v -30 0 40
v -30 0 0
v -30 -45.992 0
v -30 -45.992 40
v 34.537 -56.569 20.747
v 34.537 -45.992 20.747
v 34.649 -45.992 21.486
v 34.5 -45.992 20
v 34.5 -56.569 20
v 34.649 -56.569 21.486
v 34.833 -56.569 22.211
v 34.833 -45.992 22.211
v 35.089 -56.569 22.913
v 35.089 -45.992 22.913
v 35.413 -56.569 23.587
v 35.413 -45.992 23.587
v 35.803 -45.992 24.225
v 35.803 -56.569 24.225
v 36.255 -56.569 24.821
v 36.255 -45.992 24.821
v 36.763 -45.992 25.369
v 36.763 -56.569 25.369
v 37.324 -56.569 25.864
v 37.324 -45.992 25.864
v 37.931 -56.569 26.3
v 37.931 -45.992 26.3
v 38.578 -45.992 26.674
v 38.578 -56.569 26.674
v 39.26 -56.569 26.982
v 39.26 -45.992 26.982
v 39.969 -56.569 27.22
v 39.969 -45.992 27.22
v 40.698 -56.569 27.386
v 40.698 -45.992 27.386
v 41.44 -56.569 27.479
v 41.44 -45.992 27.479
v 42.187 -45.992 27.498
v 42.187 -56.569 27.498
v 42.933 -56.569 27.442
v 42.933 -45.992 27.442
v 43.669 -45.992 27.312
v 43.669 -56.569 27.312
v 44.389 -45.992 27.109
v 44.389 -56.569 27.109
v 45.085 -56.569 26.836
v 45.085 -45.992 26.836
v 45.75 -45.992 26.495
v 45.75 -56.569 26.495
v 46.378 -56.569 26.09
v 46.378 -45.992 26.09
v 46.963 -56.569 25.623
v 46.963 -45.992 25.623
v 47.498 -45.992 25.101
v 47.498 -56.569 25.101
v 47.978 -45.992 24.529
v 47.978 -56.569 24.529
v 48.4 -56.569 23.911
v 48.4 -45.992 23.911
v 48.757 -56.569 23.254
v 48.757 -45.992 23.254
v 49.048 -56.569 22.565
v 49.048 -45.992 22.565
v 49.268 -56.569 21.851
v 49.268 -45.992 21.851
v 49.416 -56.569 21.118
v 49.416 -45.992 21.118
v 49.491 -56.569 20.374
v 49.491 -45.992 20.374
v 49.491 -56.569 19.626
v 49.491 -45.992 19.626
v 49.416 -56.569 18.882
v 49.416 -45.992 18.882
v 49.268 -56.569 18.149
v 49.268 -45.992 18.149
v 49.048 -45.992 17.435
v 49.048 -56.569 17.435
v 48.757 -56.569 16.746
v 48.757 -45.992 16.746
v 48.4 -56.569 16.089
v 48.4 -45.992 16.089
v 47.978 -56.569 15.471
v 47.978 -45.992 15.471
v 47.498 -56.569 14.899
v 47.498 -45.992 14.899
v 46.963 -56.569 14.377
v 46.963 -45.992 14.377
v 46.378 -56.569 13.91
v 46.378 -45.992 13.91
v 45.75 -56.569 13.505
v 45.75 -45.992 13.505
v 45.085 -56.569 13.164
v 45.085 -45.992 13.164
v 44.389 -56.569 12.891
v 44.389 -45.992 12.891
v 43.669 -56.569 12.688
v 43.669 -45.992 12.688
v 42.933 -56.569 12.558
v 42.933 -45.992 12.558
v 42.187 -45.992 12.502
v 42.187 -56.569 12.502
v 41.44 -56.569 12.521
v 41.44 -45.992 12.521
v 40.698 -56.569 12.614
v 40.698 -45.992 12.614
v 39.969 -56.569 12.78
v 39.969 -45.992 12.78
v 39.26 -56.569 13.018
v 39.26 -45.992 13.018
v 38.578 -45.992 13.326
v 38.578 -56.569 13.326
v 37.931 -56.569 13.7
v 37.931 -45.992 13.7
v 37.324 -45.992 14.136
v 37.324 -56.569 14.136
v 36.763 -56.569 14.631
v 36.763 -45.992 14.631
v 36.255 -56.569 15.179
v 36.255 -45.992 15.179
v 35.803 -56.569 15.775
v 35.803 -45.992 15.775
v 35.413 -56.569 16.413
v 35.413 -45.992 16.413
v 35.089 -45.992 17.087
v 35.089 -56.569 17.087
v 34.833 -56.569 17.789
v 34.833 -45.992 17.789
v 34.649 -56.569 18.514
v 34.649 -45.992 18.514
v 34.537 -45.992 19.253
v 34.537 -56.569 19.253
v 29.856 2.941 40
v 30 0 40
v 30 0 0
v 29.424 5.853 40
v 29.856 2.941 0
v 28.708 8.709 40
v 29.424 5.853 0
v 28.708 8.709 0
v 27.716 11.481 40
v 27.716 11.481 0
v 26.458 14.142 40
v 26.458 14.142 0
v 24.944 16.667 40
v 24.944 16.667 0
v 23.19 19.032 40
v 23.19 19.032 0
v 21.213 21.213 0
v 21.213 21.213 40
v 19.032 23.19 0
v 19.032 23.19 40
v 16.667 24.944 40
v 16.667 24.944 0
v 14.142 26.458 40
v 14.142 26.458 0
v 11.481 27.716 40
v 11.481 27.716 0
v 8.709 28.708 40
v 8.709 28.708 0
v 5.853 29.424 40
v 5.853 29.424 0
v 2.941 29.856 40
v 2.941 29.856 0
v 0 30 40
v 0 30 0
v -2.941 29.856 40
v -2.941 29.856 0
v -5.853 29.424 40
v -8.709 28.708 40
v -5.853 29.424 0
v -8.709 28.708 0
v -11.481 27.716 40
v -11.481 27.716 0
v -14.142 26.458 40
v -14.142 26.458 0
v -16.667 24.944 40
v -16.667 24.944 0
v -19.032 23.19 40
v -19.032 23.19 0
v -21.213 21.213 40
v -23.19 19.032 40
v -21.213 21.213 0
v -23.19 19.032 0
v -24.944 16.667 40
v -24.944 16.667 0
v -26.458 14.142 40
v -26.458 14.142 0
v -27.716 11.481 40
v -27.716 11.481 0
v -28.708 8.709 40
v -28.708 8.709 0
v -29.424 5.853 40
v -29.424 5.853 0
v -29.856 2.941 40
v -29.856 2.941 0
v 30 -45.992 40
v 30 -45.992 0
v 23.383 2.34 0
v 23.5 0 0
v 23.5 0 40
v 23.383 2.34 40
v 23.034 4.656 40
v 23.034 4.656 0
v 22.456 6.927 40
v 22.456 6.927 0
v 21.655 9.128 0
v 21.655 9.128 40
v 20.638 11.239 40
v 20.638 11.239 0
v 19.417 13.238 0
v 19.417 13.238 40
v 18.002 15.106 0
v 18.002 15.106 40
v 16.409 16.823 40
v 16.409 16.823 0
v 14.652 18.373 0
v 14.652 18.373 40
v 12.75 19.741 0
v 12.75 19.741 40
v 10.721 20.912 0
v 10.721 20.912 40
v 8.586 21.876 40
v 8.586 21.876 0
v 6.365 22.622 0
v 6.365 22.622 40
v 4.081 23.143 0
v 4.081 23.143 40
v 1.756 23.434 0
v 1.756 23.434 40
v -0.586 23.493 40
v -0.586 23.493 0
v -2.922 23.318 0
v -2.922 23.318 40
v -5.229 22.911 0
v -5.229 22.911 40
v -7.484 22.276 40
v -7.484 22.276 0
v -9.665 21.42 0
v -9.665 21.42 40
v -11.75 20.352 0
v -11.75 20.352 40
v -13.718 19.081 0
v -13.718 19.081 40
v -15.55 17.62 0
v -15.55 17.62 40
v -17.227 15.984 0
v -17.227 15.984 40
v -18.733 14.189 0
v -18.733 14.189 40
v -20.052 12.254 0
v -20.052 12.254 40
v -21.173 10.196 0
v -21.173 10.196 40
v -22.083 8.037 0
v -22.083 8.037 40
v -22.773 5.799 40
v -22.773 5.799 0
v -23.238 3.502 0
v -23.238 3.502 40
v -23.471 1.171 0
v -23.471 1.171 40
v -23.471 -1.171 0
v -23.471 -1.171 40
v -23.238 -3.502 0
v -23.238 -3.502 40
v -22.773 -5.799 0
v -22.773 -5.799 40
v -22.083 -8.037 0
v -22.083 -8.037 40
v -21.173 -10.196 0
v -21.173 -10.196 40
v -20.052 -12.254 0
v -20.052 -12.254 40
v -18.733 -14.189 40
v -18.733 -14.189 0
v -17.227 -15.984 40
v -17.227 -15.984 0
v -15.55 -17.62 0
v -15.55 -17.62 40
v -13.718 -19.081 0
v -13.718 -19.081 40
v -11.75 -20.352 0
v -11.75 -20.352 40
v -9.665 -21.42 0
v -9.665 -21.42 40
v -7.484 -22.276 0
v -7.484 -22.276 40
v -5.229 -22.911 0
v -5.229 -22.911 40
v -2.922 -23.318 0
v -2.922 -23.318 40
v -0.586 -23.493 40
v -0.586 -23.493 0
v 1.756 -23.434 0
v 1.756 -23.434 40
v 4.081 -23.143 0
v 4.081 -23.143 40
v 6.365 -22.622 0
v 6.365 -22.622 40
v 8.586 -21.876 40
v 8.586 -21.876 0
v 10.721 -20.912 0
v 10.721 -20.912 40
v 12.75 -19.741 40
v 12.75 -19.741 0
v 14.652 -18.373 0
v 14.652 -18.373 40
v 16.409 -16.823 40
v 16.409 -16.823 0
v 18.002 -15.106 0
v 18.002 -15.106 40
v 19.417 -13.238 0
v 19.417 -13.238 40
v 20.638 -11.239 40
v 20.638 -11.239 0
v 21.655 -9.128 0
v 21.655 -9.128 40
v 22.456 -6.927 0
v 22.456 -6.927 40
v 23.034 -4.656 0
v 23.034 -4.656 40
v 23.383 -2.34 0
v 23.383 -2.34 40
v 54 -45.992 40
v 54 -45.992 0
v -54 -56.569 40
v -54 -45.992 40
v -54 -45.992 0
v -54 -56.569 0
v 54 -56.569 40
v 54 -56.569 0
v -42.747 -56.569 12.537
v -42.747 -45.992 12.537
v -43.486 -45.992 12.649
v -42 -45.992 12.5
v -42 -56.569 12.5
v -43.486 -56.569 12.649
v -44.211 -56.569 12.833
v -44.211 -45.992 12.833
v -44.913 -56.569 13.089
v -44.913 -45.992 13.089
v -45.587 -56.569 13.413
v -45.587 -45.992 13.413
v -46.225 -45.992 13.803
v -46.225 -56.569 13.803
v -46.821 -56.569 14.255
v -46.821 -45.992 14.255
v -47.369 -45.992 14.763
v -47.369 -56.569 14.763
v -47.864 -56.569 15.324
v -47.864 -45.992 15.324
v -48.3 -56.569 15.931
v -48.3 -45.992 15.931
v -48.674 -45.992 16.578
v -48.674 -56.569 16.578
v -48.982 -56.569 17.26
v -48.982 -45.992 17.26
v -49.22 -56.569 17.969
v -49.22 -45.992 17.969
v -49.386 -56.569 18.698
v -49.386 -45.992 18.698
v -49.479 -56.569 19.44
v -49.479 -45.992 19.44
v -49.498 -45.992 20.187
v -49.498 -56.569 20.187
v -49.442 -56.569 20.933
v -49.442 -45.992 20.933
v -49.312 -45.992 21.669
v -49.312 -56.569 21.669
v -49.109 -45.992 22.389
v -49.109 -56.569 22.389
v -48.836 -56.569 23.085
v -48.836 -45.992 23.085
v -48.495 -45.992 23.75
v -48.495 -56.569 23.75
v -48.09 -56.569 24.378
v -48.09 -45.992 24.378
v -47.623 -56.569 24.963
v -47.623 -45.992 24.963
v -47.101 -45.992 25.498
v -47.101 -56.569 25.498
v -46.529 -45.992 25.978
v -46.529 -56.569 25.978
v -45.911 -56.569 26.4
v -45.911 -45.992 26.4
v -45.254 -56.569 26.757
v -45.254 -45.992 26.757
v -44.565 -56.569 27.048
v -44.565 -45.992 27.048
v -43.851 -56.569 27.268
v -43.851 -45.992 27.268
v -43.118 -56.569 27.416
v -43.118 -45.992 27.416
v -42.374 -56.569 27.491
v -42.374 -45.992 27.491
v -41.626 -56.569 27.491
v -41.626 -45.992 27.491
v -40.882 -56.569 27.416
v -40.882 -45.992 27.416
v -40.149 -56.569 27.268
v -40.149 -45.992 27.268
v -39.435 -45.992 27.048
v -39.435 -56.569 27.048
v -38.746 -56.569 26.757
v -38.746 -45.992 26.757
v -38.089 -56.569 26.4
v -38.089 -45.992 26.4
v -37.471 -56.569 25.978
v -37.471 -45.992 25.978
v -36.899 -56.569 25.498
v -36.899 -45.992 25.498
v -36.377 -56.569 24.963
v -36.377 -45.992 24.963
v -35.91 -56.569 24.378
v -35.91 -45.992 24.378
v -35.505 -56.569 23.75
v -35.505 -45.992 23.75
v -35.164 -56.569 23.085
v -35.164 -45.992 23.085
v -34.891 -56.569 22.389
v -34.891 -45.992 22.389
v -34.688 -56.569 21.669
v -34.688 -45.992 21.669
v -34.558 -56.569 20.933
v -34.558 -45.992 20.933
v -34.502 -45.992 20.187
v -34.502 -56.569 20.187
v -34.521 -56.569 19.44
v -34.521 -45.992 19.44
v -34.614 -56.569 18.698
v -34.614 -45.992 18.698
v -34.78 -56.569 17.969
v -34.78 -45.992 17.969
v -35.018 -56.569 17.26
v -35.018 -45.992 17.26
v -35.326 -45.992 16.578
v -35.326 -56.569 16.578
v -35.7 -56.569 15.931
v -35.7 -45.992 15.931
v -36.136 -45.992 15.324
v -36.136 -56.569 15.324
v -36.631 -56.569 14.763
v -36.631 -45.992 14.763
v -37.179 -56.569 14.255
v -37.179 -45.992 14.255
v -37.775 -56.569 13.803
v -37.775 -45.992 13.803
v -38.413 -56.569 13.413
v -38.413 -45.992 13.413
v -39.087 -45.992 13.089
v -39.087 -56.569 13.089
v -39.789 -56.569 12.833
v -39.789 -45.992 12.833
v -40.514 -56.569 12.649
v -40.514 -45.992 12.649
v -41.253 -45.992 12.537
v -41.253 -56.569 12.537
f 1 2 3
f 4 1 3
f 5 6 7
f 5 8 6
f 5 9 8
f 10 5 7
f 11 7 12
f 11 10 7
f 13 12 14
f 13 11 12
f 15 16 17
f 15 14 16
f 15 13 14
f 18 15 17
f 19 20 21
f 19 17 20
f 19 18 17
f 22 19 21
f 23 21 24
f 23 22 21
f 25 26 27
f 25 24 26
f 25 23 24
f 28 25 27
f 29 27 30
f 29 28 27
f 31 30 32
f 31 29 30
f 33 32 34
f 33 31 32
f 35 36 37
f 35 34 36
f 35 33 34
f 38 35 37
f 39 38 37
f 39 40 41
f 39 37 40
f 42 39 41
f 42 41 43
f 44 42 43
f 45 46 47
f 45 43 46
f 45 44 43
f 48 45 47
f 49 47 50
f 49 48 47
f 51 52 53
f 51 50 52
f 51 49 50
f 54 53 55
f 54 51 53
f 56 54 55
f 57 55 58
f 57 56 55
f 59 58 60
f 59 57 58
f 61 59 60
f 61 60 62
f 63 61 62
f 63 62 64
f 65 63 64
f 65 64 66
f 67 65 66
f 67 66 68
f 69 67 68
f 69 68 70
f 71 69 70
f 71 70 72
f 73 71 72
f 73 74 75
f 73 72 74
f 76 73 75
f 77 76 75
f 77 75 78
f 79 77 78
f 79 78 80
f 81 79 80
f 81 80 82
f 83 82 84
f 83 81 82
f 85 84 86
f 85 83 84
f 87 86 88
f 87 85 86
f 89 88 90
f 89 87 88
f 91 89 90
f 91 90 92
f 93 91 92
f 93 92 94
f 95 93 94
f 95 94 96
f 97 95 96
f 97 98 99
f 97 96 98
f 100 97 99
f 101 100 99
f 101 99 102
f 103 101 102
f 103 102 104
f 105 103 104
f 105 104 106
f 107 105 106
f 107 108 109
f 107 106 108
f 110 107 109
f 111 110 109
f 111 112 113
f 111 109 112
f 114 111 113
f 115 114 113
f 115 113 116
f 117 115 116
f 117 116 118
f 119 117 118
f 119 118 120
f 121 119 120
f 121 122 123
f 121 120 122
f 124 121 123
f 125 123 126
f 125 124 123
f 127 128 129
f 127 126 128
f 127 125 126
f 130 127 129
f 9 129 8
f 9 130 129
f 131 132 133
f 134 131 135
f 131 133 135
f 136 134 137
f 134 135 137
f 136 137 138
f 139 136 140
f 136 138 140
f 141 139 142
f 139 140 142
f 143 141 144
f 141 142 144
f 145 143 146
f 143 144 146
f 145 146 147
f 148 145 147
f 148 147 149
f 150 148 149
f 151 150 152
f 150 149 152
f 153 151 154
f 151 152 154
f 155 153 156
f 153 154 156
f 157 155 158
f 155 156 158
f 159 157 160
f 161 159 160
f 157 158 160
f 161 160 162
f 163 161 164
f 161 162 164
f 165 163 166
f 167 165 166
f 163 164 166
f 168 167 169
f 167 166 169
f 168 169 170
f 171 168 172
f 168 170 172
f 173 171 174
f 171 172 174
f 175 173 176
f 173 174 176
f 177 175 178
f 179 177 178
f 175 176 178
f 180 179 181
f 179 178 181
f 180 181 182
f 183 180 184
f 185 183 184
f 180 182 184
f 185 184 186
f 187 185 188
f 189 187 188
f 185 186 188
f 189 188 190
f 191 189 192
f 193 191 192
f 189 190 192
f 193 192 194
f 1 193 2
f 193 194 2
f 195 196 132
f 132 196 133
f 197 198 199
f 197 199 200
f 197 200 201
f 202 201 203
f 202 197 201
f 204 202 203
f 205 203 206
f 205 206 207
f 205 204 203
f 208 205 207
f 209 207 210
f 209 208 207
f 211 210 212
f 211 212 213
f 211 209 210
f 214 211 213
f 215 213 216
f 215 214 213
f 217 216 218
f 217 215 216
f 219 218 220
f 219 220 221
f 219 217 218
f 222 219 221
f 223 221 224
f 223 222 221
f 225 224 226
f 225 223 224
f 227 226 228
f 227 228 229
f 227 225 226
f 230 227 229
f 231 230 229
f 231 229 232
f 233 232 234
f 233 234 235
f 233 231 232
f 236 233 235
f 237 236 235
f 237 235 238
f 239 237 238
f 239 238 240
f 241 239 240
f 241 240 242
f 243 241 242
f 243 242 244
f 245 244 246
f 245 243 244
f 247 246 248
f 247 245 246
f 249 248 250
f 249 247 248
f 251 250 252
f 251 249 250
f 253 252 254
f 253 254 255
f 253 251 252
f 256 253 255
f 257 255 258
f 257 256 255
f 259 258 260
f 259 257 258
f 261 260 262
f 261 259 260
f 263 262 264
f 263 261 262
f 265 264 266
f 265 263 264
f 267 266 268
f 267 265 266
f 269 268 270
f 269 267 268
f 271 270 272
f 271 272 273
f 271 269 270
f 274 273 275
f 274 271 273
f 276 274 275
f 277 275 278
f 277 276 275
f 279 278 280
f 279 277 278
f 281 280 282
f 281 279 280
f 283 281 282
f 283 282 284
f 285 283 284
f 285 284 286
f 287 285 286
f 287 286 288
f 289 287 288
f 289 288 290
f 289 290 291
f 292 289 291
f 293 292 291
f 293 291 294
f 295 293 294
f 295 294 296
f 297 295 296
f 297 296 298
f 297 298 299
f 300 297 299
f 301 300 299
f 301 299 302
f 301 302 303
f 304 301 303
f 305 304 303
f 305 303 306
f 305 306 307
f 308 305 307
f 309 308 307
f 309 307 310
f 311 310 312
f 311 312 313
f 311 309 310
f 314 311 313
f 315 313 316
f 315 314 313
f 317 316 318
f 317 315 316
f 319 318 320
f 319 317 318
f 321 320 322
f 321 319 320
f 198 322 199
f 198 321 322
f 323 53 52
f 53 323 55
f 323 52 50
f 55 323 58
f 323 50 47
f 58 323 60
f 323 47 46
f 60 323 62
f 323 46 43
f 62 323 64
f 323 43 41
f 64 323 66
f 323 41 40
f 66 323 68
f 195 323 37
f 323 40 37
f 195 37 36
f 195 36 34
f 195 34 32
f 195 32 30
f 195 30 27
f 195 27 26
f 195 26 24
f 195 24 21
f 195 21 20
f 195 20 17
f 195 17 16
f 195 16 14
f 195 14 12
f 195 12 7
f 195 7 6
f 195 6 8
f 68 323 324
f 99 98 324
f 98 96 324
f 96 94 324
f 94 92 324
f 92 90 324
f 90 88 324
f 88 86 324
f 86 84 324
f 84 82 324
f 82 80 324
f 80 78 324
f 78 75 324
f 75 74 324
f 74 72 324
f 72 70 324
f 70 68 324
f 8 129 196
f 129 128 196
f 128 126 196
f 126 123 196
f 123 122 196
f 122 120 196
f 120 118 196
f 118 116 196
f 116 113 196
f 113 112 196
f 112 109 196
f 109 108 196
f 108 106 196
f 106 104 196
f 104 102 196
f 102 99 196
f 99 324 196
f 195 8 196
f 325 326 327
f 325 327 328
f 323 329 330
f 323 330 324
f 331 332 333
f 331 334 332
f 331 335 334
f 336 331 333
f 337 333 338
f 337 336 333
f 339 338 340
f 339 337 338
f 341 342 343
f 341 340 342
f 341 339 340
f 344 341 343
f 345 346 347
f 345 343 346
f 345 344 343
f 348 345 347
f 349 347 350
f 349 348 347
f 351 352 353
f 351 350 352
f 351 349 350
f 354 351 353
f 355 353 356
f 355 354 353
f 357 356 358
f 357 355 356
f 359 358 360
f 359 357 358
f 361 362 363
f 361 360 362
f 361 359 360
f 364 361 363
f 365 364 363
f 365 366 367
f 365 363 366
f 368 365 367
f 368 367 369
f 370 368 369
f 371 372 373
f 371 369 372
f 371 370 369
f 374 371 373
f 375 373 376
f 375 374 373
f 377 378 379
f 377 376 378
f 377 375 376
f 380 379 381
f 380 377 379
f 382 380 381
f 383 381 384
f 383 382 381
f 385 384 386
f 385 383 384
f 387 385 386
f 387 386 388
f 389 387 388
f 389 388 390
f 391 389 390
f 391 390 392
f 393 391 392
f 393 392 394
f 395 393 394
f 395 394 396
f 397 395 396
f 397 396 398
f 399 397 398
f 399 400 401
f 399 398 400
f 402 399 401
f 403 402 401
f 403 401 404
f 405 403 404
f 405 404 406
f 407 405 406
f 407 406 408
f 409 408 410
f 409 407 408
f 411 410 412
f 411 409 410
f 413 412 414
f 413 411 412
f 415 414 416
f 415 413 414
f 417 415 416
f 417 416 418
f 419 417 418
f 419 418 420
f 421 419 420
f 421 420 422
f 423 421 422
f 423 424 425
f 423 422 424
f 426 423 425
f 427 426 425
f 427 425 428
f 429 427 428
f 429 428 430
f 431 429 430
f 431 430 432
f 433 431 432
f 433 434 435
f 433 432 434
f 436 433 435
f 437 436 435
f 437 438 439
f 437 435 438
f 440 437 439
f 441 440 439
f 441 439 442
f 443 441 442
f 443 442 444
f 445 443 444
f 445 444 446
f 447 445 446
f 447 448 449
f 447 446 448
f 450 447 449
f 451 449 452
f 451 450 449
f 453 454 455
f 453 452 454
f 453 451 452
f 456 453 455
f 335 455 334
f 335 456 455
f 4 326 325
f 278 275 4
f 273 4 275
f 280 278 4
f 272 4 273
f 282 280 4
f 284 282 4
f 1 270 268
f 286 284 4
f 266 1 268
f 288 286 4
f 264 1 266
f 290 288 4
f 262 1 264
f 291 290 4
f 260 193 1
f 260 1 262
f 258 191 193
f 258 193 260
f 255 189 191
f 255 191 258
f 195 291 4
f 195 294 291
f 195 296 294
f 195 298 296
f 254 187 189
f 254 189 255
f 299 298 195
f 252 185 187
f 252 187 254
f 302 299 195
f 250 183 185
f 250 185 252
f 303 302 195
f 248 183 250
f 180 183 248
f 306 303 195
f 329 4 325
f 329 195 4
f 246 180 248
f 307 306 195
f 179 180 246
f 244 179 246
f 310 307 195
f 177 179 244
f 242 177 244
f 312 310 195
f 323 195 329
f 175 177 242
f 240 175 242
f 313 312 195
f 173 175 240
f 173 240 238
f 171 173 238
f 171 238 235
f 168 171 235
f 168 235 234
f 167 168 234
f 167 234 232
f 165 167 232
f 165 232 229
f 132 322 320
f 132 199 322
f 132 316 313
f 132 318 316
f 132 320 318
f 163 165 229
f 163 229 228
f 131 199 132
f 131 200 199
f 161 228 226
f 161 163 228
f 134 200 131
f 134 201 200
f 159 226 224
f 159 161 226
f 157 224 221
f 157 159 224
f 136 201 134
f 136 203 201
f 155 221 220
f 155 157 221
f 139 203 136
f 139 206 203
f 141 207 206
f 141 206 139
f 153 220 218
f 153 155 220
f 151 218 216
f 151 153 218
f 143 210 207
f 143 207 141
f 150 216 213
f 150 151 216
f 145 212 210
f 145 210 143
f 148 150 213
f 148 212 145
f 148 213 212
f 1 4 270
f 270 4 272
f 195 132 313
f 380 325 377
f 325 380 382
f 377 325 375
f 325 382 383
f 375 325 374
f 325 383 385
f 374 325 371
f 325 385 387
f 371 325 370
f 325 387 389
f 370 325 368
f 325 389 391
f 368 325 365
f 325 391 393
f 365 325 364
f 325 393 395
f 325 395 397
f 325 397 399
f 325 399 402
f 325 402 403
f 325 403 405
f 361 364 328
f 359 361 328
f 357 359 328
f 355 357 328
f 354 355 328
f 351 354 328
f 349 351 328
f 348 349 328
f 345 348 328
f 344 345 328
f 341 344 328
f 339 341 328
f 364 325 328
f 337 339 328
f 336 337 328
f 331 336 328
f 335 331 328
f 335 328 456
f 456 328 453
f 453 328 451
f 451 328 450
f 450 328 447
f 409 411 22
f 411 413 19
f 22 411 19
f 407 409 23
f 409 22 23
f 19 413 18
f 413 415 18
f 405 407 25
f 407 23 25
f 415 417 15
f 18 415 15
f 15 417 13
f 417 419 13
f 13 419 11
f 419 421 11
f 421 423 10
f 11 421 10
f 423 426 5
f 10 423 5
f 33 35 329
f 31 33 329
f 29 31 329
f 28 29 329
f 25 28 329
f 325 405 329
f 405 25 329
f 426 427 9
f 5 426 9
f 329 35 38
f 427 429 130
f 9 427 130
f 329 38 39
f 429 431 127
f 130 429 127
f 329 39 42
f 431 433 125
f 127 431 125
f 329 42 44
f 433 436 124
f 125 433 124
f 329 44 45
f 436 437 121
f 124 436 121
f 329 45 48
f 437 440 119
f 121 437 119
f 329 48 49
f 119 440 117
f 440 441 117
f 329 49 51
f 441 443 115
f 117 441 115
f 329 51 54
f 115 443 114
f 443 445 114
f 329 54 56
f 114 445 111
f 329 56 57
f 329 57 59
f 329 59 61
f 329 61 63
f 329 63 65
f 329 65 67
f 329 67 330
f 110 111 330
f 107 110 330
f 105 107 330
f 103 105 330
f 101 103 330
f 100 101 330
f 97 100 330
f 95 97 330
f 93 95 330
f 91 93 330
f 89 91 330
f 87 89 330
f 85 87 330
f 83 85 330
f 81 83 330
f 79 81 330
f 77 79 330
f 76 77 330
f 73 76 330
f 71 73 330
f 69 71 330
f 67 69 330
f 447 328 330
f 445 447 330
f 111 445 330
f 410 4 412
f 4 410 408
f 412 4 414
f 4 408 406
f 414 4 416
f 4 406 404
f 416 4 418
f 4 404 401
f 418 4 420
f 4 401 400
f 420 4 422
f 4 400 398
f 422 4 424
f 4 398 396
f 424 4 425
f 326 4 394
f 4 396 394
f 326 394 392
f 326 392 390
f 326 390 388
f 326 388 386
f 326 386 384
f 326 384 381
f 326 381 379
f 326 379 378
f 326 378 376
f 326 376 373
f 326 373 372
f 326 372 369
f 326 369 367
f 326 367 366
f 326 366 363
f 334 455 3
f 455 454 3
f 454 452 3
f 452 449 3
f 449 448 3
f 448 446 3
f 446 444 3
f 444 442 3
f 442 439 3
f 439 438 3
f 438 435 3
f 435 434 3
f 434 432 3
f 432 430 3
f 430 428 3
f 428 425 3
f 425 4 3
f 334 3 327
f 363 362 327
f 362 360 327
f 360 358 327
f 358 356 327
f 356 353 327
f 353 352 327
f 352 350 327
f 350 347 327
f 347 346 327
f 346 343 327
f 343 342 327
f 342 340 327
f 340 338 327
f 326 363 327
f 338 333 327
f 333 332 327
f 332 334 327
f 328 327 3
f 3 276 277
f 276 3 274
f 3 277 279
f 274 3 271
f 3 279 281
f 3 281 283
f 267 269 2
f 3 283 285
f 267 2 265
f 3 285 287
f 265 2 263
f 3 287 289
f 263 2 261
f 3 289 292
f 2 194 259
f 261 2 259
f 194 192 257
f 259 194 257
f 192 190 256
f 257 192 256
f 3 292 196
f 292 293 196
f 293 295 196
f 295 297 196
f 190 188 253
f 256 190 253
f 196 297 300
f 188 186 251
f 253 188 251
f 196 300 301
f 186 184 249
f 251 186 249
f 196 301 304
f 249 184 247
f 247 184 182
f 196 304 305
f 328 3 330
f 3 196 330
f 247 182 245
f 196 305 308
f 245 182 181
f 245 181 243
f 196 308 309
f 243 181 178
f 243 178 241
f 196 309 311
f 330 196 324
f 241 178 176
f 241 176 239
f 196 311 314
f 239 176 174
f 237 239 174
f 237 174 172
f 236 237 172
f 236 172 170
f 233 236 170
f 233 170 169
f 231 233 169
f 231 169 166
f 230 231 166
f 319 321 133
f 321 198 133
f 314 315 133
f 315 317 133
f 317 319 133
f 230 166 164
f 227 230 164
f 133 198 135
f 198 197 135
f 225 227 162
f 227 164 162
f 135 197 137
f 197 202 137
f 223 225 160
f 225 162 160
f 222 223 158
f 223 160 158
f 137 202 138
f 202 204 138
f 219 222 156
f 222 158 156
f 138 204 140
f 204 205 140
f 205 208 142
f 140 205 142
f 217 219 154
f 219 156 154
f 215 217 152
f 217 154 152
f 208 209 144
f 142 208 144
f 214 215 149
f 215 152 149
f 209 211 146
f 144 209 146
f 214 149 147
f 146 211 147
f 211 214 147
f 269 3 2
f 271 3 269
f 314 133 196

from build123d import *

# Parameters (mm, degrees)
SKETCH1_R               = 23.5
BOSS_EXTRUDE1_DEPTH     = 40
CUT_EXTRUDE1_DEPTH      = 102.443199391
CUT_EXTRUDE1_DEPTH_BACK = 102.443199391
SKETCH2_R               = 7.5


with BuildPart() as part:
    # Sketch1 → Boss-Extrude1 (new body)
    with BuildSketch(Plane.XY):
        with BuildLine():
            Line((-30, 0), (-30, -45.991596264))
            Line((-30, -45.991596264), (-54, -45.991596264))
            Line((-54, -45.991596264), (-54, -56.568744975))
            Line((-54, -56.568744975), (54, -56.568744975))
            Line((54, -56.568744975), (54, -45.991596264))
            Line((54, -45.991596264), (30, -45.991596264))
            Line((30, -45.991596264), (30, 0))
            ThreePointArc((30, 0), (0, 30), (-30, 0))
        make_face()
        Circle(SKETCH1_R, mode=Mode.SUBTRACT)
    extrude(amount=BOSS_EXTRUDE1_DEPTH)

    # Sketch2 → Cut-Extrude1 (cut, two sides: drawn at the far end of the back side and taken through both)
    with BuildSketch(Plane(origin=(0, -45.991596264, 0), x_dir=(1, 0, 0), z_dir=(0, 1, 0)).offset(-CUT_EXTRUDE1_DEPTH_BACK)):
        with Locations(Location((42, -20, 0), (0, 0, 180))):
            Circle(SKETCH2_R)
        with Locations(Location((-42, -20, 0), (0, 0, 90))):
            Circle(SKETCH2_R)
    extrude(amount=CUT_EXTRUDE1_DEPTH + CUT_EXTRUDE1_DEPTH_BACK, mode=Mode.SUBTRACT)


solid = part.part
